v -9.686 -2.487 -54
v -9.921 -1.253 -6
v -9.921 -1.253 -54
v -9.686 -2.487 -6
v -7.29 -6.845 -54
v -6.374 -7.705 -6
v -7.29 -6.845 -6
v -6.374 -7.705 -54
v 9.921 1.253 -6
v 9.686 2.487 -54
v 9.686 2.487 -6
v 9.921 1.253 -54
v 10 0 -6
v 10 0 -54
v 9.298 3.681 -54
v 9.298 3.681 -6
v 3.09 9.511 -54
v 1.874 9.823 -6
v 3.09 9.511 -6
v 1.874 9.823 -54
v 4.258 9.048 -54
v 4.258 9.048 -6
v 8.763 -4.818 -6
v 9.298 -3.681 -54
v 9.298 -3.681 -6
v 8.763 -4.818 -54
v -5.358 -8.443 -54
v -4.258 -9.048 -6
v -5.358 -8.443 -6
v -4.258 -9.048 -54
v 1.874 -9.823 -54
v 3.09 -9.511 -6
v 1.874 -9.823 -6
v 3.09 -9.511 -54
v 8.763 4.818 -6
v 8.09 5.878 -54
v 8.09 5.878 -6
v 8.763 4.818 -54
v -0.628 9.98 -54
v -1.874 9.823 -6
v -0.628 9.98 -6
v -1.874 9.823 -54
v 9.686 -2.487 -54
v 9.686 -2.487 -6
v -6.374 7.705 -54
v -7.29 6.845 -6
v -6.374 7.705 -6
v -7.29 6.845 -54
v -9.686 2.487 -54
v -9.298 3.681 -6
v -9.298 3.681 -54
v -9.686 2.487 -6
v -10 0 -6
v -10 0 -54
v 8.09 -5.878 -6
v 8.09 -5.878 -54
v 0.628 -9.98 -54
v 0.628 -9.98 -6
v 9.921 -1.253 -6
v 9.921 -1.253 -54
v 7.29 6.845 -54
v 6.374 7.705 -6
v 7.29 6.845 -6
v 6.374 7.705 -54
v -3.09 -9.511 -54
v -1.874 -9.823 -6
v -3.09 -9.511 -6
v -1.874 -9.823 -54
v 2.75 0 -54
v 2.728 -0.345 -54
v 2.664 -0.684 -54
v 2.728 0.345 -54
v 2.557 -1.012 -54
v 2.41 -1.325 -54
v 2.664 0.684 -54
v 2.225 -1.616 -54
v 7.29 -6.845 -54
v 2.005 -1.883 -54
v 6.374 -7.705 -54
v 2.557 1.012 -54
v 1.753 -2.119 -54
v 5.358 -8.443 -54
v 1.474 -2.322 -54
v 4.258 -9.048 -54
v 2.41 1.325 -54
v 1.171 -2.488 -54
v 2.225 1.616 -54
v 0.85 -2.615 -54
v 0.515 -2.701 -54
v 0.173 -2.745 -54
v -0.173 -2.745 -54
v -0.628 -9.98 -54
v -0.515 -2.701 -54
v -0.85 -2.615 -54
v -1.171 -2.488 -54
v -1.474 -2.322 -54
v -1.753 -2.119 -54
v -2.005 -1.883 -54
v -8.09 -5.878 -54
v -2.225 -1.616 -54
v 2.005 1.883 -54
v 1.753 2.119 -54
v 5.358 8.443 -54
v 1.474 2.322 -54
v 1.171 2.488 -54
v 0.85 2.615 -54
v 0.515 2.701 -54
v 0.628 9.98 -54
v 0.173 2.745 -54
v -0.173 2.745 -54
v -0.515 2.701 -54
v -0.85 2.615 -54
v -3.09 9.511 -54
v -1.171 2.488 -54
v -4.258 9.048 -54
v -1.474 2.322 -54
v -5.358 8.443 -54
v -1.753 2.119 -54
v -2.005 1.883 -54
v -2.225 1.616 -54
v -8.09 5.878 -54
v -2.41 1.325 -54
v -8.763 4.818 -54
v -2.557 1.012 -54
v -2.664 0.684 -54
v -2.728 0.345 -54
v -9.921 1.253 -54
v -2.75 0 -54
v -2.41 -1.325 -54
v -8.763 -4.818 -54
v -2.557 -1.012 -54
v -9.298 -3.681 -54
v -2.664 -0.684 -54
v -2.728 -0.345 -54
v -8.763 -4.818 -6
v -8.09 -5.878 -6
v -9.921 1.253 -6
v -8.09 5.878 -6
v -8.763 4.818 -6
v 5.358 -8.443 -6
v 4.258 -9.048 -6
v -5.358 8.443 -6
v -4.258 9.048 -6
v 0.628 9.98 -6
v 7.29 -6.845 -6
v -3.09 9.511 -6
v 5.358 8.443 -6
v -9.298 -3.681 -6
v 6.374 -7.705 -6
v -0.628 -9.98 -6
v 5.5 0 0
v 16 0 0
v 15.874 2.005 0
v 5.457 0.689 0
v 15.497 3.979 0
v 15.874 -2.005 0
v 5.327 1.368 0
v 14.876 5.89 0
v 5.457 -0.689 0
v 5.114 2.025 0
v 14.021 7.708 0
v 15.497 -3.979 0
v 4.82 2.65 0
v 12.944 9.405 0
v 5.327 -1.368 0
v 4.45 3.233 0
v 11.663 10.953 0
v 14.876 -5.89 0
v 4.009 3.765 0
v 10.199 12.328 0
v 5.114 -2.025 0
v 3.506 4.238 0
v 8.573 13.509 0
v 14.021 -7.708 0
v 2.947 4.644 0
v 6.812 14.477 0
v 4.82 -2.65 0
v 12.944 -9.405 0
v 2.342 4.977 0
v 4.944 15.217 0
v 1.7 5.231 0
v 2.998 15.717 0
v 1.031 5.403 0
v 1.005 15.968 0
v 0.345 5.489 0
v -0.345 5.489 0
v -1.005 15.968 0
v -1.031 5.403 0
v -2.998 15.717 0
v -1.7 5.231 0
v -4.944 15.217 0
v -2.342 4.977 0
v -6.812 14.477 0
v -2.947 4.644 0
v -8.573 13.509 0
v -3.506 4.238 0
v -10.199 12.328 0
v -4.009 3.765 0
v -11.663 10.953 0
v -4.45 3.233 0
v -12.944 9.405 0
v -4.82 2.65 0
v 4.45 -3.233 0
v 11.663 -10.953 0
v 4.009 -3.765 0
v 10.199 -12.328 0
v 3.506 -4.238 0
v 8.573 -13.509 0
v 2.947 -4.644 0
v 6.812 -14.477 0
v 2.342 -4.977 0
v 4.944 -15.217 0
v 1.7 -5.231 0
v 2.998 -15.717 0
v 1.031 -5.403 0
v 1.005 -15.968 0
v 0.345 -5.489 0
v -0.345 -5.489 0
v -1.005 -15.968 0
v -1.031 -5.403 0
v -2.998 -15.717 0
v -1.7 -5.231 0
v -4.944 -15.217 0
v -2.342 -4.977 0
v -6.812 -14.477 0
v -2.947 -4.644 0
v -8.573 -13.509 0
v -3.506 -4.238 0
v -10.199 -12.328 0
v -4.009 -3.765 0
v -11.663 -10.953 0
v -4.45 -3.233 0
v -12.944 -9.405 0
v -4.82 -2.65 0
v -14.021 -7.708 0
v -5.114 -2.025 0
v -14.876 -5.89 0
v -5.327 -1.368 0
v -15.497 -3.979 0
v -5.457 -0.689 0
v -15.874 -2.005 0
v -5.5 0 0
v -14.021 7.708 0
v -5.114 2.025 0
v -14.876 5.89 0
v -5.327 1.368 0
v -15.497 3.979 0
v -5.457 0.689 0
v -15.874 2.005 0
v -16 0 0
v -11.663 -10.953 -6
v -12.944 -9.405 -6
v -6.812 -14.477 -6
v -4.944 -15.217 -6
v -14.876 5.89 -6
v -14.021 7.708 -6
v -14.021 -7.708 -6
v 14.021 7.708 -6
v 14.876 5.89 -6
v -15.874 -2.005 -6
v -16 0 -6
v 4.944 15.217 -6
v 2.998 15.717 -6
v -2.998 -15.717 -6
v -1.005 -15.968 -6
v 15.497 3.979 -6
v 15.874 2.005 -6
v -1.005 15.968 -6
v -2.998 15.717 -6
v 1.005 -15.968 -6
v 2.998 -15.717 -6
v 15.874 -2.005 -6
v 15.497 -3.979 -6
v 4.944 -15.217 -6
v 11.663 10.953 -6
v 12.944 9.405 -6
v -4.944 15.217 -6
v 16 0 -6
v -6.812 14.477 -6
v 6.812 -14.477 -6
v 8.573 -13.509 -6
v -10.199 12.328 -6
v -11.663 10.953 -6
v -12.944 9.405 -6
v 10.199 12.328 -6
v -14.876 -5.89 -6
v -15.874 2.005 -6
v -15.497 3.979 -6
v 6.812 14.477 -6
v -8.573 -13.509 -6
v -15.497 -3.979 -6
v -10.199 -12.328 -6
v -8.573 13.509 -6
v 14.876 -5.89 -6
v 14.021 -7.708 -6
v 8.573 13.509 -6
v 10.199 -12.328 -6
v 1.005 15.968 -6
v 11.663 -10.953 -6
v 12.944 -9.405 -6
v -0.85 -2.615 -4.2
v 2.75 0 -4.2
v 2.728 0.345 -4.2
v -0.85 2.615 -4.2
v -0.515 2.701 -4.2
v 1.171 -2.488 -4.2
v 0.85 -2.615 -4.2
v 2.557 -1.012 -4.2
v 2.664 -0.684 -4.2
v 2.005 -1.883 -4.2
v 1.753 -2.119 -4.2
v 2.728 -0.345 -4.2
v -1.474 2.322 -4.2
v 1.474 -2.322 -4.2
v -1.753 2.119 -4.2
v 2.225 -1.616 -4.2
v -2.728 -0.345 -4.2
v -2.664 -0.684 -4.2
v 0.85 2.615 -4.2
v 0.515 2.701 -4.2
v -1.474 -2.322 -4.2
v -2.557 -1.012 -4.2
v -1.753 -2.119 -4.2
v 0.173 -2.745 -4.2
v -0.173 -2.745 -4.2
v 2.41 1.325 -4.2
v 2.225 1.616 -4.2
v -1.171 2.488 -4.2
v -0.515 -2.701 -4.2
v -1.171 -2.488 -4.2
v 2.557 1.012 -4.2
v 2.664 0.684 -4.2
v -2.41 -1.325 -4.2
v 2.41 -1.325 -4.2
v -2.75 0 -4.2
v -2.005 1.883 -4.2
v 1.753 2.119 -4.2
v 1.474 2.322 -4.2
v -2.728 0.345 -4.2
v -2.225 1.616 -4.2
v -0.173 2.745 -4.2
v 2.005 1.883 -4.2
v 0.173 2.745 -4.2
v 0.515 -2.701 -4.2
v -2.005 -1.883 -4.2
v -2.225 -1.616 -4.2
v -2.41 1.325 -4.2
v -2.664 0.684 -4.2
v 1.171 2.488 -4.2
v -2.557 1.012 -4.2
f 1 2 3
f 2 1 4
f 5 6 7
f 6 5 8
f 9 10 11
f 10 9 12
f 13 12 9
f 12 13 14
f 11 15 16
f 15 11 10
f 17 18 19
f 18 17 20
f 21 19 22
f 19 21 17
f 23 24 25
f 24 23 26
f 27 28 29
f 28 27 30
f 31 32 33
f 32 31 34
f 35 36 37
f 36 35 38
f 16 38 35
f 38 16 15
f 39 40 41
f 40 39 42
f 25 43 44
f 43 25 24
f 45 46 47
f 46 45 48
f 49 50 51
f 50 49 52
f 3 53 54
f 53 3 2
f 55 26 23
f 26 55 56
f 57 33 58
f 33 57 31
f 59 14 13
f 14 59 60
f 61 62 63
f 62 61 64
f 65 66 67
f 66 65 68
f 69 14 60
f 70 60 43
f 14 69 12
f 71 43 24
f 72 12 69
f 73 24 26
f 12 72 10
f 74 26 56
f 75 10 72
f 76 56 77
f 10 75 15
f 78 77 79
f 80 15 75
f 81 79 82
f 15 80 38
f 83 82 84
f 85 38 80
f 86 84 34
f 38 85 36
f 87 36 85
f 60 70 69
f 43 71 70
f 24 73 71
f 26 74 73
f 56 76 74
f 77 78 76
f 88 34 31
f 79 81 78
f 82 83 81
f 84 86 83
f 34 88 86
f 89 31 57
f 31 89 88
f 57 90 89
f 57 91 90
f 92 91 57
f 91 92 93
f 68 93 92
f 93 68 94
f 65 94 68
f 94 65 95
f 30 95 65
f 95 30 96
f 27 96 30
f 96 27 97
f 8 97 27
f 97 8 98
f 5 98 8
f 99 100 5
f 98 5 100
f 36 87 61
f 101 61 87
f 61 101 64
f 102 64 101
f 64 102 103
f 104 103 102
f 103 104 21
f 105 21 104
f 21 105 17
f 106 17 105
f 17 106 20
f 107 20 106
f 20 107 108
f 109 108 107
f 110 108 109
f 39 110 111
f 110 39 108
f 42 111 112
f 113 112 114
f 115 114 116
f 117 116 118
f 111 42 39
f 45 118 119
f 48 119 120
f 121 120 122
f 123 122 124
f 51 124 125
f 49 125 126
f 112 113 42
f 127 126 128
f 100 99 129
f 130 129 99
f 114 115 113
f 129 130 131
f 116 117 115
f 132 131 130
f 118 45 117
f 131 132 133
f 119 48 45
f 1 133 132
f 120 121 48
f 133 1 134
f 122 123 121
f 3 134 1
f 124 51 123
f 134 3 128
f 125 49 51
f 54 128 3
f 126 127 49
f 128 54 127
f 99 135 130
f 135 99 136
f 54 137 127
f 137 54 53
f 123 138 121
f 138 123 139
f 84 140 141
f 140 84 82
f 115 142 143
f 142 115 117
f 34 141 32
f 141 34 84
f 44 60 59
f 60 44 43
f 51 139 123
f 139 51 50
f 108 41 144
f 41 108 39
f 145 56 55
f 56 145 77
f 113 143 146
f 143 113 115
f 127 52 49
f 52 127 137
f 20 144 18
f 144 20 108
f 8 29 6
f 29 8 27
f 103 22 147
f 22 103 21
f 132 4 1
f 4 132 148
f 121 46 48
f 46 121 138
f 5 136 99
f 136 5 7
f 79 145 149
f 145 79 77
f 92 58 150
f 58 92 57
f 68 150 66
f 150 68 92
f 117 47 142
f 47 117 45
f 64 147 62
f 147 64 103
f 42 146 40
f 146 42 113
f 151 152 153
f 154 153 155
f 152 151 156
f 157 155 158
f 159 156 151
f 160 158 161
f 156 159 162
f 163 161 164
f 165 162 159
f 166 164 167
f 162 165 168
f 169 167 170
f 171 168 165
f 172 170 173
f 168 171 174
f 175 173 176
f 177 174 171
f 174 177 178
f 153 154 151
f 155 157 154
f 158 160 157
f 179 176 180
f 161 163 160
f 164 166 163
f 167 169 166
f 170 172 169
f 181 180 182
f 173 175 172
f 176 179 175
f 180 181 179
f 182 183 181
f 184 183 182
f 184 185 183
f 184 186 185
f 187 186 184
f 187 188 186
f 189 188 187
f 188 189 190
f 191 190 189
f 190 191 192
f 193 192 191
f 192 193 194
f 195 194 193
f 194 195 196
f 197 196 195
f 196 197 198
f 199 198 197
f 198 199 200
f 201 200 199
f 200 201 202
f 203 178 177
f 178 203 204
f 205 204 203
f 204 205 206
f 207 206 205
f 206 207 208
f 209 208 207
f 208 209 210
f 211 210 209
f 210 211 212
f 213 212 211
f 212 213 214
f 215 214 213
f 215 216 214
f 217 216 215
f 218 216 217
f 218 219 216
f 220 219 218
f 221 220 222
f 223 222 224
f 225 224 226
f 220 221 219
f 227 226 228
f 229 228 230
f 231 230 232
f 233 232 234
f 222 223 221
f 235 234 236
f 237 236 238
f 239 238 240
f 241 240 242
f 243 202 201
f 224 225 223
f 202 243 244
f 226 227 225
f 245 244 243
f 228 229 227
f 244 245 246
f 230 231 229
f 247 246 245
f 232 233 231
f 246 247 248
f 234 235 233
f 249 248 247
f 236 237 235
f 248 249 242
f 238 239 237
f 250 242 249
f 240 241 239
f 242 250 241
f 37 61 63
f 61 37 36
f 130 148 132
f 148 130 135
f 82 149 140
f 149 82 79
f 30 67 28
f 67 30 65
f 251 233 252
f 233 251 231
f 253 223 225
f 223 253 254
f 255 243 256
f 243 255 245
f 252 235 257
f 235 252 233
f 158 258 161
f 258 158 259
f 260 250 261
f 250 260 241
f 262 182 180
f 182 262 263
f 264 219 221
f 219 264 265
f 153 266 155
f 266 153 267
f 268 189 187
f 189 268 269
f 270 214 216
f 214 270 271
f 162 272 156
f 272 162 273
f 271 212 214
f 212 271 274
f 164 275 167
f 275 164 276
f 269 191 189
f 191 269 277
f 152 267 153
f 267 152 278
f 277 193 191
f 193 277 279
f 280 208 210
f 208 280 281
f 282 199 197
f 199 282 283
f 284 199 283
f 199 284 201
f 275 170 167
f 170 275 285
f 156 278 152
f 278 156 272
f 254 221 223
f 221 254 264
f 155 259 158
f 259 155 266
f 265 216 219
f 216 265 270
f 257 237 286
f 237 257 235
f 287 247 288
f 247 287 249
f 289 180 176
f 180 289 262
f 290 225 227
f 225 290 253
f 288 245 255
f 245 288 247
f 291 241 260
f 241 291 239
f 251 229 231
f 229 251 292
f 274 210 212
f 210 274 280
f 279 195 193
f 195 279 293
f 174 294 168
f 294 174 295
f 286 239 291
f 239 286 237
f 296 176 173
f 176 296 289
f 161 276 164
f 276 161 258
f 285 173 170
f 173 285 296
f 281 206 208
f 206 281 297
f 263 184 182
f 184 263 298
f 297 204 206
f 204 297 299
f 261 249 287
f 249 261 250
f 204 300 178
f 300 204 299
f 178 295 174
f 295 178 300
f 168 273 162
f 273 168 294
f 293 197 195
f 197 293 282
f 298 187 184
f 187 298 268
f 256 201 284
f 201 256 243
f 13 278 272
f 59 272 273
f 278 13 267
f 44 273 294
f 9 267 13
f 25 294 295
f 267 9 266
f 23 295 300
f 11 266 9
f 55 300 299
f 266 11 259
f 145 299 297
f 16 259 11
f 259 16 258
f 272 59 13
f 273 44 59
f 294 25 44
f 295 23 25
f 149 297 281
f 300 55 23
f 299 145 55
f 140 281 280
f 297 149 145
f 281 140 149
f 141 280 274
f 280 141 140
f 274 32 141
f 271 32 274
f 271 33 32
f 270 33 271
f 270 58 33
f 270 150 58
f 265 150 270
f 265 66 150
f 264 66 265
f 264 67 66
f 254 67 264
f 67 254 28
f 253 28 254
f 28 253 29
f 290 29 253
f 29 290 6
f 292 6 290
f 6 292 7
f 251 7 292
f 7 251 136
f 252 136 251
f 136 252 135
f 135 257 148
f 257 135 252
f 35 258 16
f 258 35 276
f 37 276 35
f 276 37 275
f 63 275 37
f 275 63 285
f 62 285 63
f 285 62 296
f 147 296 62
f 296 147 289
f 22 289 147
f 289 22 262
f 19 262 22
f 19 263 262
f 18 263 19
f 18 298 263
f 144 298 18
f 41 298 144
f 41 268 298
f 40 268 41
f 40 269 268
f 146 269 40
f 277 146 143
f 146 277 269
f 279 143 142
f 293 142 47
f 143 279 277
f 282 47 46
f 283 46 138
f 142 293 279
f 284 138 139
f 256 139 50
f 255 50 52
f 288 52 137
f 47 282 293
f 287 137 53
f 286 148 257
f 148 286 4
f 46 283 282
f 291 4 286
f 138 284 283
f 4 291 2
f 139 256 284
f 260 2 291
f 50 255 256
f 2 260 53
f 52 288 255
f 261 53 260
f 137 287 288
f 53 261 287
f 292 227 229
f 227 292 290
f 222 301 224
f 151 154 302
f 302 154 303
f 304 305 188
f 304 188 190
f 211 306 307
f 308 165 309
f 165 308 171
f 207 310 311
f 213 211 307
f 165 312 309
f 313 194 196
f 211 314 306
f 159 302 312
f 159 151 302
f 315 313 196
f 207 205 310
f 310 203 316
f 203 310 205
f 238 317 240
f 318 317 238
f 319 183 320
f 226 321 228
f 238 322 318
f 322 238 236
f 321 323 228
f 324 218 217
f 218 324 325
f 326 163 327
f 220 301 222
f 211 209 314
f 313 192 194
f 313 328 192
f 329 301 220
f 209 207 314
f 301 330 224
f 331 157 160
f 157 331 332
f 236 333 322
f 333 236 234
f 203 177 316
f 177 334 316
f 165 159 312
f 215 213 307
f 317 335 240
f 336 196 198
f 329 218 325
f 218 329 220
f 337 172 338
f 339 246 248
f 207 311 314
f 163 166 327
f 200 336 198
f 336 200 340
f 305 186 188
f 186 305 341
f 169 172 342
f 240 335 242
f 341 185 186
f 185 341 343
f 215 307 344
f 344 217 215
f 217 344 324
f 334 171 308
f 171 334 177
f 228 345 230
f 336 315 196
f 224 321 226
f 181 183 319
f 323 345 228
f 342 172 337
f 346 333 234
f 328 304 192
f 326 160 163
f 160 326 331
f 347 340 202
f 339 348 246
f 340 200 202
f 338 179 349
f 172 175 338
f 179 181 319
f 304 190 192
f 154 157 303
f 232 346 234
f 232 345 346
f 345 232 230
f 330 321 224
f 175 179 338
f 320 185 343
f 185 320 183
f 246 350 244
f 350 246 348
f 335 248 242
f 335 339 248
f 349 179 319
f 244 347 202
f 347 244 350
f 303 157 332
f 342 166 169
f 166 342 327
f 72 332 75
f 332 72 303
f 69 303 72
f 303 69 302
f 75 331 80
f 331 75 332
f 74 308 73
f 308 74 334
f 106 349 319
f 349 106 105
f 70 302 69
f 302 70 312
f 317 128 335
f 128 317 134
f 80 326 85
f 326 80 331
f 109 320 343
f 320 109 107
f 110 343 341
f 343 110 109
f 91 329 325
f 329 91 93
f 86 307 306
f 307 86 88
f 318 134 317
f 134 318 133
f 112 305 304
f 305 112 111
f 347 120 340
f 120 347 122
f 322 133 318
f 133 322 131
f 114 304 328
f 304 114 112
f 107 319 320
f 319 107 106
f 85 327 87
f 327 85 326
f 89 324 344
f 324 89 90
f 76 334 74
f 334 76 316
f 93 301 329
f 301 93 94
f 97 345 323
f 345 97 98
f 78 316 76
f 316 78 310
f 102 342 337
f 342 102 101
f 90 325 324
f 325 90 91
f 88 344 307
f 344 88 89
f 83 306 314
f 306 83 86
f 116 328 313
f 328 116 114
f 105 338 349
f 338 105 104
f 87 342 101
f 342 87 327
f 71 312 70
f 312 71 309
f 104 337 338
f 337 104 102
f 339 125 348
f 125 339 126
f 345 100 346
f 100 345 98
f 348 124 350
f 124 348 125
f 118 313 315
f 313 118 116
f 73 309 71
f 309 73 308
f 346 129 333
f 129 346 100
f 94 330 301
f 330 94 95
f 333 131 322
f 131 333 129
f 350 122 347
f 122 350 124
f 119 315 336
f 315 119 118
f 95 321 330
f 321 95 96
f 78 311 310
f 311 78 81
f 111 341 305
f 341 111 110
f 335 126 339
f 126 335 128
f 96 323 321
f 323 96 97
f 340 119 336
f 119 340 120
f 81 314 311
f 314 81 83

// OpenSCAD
$fn = 50;


difference() {
	union() {
		translate(v = [0, 0, -54.0000000000]) {
			cylinder(h = 54, r = 10.0000000000);
		}
		translate(v = [0, 0, -6.0000000000]) {
			cylinder(h = 6, r = 16.0000000000);
		}
	}
	union() {
		translate(v = [0, 0, 0]) {
			rotate(a = [0, 0, 0]) {
				difference() {
					union() {
						#translate(v = [0, 0, -54.0000000000]) {
							cylinder(h = 54, r = 2.2500000000);
						}
						#translate(v = [0, 0, -4.2000000000]) {
							cylinder(h = 4.2000000000, r1 = 2.7500000000, r2 = 5.5000000000);
						}
						#translate(v = [0, 0, -54.0000000000]) {
							cylinder(h = 54, r = 2.7500000000);
						}
						#translate(v = [0, 0, -54.0000000000]) {
							cylinder(h = 54, r = 2.2500000000);
						}
					}
					union();
				}
			}
		}
	}
}
